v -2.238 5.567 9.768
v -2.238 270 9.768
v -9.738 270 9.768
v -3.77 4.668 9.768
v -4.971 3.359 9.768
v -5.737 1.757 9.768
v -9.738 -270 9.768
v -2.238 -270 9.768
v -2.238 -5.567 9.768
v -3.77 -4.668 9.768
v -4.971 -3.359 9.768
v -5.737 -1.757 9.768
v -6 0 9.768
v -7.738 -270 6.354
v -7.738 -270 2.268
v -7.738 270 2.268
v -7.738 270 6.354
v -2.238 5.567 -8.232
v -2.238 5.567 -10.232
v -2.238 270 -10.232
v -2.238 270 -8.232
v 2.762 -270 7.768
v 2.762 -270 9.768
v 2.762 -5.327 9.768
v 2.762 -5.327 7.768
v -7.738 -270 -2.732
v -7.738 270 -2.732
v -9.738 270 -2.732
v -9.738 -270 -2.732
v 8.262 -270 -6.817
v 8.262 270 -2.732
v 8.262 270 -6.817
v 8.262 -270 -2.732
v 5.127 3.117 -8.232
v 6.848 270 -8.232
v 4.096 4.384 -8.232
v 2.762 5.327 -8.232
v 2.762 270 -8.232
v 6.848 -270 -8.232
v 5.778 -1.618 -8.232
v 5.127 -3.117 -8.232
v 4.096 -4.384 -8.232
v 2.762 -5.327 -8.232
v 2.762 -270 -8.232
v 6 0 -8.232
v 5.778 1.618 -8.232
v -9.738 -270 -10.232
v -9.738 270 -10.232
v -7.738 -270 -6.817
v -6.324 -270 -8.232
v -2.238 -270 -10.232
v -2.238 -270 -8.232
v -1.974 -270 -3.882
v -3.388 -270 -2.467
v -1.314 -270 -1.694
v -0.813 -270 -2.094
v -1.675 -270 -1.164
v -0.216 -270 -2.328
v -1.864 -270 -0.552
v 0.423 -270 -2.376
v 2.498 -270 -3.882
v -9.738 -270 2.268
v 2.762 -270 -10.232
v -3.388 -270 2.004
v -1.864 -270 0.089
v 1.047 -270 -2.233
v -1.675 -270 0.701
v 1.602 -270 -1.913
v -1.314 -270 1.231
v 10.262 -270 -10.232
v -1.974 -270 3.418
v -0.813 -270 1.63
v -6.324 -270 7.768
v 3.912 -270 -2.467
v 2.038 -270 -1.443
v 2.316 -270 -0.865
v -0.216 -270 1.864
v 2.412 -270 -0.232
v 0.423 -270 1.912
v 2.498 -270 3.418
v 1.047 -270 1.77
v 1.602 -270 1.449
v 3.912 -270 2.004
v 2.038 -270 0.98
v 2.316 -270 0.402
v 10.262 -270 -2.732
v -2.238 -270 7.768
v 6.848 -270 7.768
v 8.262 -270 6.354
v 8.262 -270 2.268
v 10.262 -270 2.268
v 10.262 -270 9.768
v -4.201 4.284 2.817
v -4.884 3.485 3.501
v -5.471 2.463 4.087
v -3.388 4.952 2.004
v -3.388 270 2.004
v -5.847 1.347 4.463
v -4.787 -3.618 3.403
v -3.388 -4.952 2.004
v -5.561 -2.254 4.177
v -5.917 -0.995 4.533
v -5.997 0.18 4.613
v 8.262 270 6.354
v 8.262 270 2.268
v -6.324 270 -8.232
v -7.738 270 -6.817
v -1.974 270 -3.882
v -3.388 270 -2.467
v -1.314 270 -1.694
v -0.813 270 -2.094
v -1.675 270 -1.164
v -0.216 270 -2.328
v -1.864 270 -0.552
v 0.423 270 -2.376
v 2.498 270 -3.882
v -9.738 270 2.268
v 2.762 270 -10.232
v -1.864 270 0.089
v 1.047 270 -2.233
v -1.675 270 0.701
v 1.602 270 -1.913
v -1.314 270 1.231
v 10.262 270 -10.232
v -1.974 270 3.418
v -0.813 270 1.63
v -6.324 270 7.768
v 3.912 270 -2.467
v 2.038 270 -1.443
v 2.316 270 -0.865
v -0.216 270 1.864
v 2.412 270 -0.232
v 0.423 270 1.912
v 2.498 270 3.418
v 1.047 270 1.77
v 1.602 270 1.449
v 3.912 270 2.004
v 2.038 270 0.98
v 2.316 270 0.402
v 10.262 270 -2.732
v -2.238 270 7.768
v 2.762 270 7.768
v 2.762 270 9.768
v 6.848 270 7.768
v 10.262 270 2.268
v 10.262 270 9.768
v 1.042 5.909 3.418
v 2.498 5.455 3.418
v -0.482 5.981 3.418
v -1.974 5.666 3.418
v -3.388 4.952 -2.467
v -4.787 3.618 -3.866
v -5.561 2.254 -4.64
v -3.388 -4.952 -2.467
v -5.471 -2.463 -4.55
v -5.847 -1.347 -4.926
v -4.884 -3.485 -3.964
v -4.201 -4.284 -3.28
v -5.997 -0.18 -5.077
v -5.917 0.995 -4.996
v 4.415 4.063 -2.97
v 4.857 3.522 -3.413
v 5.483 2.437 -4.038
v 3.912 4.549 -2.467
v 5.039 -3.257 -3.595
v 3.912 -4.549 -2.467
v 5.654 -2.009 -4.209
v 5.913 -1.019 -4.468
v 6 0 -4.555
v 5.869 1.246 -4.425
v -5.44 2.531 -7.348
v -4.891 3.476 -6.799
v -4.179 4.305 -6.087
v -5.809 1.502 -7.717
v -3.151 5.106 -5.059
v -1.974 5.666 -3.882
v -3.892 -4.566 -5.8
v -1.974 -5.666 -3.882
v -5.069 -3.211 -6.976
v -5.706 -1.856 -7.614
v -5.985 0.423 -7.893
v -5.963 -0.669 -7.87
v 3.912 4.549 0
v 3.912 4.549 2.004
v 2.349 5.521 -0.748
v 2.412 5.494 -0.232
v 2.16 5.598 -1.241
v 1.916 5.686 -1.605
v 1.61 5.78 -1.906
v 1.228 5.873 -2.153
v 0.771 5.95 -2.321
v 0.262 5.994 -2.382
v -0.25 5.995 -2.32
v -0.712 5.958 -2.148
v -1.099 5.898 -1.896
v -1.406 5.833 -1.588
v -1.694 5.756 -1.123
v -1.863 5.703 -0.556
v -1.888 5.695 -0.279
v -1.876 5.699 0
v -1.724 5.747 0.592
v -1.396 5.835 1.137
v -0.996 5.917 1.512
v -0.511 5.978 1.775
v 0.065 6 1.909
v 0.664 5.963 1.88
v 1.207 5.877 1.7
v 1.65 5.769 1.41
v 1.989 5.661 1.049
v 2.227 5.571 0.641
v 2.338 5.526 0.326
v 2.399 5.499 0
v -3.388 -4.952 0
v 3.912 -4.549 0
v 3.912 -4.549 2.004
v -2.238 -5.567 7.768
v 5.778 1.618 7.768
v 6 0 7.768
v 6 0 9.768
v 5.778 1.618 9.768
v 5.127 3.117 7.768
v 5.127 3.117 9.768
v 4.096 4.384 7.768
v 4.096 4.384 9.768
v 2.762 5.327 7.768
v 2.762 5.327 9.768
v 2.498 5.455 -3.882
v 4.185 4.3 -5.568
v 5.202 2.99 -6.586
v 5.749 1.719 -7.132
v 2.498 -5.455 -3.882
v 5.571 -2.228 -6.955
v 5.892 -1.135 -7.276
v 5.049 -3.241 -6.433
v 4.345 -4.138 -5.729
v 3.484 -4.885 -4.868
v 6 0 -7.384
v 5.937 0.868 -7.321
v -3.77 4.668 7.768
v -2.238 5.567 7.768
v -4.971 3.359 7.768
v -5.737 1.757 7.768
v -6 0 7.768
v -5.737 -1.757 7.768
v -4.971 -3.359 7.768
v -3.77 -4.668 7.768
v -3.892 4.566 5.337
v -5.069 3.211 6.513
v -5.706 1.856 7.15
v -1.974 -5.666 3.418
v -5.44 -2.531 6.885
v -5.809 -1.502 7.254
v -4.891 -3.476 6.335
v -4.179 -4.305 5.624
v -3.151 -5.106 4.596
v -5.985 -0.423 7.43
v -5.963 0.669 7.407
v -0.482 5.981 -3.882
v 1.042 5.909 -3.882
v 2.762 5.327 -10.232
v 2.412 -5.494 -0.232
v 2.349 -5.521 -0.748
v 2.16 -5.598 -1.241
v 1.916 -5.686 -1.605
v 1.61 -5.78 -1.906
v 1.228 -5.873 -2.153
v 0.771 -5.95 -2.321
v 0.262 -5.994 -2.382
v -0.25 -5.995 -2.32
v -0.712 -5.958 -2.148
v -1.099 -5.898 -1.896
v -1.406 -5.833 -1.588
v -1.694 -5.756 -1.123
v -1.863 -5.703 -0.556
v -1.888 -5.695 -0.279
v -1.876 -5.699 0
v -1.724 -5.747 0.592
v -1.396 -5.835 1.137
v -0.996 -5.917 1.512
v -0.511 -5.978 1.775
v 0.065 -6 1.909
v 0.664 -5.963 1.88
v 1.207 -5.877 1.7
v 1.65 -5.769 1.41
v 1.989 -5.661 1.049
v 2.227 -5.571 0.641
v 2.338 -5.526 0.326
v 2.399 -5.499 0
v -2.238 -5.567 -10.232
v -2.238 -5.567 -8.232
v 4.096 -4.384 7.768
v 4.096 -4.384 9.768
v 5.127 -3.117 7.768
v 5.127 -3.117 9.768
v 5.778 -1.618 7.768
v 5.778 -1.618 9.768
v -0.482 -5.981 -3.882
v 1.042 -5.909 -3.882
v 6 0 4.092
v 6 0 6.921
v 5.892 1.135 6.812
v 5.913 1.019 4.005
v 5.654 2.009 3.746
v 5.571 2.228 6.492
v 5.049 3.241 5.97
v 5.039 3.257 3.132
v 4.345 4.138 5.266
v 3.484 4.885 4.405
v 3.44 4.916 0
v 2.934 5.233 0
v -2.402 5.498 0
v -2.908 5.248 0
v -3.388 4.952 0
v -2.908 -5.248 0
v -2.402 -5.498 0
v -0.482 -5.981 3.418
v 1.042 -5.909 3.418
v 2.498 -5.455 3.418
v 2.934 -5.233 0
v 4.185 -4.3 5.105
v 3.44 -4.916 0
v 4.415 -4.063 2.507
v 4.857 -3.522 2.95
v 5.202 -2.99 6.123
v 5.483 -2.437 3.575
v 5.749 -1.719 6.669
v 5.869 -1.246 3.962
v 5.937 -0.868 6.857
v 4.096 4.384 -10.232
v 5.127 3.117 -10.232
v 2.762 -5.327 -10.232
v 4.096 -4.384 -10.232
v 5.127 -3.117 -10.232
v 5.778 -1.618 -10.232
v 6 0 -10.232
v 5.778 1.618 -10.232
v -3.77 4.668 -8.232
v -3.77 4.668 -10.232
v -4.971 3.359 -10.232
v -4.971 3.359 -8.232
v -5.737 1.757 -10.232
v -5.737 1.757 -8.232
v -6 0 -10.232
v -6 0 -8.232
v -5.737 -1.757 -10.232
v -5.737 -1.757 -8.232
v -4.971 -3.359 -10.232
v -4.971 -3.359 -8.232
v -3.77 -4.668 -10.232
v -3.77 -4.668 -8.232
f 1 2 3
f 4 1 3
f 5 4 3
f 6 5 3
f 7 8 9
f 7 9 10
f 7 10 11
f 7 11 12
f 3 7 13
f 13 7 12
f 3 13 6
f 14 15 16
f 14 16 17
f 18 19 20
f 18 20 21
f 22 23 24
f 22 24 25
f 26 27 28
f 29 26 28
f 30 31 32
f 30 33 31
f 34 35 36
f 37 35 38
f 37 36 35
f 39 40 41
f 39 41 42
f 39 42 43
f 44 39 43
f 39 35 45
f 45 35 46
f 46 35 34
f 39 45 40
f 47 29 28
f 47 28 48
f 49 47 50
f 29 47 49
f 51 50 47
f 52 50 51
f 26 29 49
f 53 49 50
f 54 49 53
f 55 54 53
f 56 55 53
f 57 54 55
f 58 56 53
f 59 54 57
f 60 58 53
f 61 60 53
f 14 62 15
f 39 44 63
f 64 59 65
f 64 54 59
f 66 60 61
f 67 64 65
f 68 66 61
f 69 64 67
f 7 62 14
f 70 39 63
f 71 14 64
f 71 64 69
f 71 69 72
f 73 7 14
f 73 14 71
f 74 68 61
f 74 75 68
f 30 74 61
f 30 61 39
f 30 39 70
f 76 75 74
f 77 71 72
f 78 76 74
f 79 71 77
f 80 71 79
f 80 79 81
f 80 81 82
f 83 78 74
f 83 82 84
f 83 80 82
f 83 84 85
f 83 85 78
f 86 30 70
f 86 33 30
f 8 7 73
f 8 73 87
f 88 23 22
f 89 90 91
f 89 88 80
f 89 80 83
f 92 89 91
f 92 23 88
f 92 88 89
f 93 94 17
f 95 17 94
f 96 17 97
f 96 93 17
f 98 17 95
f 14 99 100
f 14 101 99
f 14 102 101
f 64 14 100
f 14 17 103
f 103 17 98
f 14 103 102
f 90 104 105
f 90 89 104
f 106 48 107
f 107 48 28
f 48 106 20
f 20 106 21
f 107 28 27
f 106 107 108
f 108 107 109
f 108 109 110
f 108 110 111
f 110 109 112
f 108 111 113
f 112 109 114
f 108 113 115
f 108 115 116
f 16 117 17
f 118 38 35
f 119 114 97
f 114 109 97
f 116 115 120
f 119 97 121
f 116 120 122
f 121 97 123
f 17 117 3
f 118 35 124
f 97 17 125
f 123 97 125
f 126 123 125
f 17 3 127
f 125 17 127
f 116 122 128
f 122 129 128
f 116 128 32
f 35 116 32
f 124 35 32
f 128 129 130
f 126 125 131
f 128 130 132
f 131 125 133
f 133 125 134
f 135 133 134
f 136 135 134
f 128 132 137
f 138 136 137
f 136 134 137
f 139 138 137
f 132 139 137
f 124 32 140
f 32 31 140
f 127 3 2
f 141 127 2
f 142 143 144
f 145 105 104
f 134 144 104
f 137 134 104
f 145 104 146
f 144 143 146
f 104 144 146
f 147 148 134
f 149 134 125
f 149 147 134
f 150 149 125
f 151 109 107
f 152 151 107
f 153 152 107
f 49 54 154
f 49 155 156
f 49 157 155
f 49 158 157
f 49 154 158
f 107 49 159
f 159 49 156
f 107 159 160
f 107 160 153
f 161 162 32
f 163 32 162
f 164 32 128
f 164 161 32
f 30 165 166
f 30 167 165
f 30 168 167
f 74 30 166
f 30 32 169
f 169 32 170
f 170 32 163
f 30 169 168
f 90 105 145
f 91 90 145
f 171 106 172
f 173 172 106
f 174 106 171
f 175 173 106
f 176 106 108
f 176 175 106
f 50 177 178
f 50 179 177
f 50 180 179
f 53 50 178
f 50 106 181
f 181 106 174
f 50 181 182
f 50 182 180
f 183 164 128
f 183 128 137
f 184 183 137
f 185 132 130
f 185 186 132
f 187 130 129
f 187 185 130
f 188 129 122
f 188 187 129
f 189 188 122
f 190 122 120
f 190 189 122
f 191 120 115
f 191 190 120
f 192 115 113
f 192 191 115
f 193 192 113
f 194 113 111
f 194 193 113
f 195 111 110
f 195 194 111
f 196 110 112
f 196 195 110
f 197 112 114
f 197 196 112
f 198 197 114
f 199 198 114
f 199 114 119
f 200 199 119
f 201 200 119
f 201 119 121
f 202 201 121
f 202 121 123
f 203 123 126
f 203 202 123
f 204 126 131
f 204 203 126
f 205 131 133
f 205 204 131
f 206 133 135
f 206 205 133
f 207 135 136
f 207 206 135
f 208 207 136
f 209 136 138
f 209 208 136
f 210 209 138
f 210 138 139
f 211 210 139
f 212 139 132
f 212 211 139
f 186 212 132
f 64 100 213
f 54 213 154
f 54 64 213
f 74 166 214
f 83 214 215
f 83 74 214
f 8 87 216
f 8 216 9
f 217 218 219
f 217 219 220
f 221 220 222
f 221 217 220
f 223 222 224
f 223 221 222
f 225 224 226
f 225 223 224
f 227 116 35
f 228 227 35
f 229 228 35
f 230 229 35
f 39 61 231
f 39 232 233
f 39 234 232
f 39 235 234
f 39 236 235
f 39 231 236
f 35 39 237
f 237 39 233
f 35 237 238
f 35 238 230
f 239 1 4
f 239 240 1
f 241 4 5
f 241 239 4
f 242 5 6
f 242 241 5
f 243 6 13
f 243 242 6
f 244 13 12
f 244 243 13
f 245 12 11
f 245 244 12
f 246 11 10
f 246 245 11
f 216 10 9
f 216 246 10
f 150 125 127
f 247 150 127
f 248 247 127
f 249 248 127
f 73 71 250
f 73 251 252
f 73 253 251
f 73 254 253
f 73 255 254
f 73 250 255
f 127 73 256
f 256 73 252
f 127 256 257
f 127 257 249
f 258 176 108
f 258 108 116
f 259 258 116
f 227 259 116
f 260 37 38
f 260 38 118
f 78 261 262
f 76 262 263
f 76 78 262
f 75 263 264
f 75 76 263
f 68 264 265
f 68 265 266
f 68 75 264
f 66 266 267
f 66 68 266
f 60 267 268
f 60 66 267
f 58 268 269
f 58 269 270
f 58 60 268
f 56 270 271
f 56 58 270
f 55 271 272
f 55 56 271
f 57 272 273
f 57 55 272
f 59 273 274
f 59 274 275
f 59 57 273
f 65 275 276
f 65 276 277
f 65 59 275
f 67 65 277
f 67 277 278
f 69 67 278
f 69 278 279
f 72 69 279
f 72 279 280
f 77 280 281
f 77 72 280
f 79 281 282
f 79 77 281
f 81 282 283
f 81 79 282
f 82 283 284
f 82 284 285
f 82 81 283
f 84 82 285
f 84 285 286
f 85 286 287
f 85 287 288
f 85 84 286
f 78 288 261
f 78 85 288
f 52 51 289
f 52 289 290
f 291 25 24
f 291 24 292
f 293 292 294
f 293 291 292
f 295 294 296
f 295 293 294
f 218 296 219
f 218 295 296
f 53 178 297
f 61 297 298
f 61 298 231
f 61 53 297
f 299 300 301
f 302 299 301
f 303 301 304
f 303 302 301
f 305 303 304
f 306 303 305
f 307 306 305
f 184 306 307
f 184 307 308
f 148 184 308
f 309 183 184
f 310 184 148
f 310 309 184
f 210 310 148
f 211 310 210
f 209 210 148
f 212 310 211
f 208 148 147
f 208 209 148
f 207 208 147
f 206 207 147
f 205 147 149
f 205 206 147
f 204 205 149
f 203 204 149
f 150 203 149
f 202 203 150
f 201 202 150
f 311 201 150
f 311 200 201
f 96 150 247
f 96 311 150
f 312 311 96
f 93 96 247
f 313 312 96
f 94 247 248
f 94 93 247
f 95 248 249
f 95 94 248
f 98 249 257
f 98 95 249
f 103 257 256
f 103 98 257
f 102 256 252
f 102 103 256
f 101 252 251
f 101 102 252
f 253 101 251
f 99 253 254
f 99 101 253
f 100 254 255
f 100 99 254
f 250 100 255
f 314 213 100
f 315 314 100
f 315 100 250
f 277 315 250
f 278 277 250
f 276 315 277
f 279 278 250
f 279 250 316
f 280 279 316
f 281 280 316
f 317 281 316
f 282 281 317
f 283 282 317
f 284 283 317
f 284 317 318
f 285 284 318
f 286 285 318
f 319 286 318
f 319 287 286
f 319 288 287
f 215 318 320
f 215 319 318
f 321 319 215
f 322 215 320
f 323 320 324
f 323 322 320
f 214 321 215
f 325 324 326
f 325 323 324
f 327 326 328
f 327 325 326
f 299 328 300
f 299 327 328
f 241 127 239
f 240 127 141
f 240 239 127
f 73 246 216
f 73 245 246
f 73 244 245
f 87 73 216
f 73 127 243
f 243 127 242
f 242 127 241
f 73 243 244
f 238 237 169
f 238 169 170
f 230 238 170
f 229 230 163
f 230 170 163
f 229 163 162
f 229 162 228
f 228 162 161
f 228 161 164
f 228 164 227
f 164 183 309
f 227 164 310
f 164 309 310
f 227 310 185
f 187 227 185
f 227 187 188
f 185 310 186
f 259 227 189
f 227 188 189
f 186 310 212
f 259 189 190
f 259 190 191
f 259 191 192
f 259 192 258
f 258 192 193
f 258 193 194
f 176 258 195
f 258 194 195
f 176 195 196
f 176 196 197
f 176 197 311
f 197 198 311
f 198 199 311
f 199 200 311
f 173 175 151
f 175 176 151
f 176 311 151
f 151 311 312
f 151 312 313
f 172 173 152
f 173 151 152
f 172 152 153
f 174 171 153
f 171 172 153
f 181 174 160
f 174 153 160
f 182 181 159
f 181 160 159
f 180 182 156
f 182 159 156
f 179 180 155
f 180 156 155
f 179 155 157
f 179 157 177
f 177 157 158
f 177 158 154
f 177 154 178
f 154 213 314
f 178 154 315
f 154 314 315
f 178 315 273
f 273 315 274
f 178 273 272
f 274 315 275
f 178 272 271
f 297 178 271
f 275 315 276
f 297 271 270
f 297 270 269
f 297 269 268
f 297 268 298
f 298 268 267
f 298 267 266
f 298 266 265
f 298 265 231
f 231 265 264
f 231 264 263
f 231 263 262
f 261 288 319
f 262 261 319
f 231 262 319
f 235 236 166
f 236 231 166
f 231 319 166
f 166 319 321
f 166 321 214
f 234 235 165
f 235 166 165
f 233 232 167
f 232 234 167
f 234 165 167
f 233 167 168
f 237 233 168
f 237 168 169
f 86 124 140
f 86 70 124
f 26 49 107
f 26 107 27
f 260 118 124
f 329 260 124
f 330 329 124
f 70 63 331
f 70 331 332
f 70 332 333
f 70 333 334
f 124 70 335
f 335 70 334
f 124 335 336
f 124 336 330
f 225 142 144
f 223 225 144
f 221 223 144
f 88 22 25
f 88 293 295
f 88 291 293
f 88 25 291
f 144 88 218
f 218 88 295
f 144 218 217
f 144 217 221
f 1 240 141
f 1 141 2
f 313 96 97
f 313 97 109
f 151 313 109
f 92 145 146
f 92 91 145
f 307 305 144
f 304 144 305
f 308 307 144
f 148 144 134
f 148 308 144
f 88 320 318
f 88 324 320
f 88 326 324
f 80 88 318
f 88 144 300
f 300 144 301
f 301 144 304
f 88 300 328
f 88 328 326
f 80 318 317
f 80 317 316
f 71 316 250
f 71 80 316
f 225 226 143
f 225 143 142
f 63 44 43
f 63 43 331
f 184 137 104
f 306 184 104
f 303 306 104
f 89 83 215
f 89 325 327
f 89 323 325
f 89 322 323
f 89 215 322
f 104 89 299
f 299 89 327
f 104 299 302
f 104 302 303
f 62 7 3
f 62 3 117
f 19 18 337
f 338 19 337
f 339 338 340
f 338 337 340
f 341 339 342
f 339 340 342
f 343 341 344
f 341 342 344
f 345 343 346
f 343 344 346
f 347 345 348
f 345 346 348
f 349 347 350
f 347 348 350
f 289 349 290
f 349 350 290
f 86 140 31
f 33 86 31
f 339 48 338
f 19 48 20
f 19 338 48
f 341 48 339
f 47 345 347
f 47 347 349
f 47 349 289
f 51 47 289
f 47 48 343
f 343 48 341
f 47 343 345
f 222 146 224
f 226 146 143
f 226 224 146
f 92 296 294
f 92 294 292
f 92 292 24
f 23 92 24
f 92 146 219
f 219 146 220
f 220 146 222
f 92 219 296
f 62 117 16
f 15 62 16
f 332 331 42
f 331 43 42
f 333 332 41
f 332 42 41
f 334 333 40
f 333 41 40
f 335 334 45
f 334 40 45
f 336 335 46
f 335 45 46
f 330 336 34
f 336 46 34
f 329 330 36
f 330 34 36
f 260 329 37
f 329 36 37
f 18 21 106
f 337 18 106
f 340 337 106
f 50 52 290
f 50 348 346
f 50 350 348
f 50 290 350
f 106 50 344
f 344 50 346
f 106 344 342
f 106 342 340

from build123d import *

# Parameters (mm, degrees)
F1_DEPTH      = 270
F1_DEPTH_BACK = 270
F2_R          = 6
F3_DEPTH      = 25
F3_DEPTH_BACK = 25


with BuildPart() as f1:
    # F0 (on Front) → F1 (new body, two sides)
    with BuildSketch(Plane.XZ) as f1_sk:
        Polygon((-2.2380451747, 9.7684033074), (-9.7380451747, 9.7684033074), (-9.7380451747, 2.2684033074), (-7.7380451747, 2.2684033074), (-7.7380451747, 6.354189745), (-3.3880451747, 2.004189745), (-3.3880451747, -0.2315966926), (-3.3880451747, -2.4673831302), (-7.7380451747, -6.8173831302), (-7.7380451747, -2.7315966926), (-9.7380451747, -2.7315966926), (-9.7380451747, -10.2315966926), (-2.2380451747, -10.2315966926), (-2.2380451747, -8.2315966926), (-6.3238316124, -8.2315966926), (-1.9738316124, -3.8815966926), (2.4977412629, -3.8815966926), (6.8477412629, -8.2315966926), (2.7619548253, -8.2315966926), (2.7619548253, -10.2315966926), (10.2619548253, -10.2315966926), (10.2619548253, -2.7315966926), (8.2619548253, -2.7315966926), (8.2619548253, -6.8173831302), (3.9119548253, -2.4673831302), (3.9119548253, -0.2315966926), (3.9119548253, 2.004189745), (8.2619548253, 6.354189745), (8.2619548253, 2.2684033074), (10.2619548253, 2.2684033074), (10.2619548253, 9.7684033074), (2.7619548253, 9.7684033074), (2.7619548253, 7.7684033074), (6.8477412629, 7.7684033074), (2.4977412629, 3.4184033074), (-1.9738316124, 3.4184033074), (-6.3238316124, 7.7684033074), (-2.2380451747, 7.7684033074), align=None)
        with BuildLine():
            ThreePointArc((-1.8880451747, -0.2315966926), (0.2619548253, 1.9184033074), (2.4119548253, -0.2315966926))
            ThreePointArc((2.4119548253, -0.2315966926), (0.2619548253, -2.3815966926), (-1.8880451747, -0.2315966926))
        make_face(mode=Mode.SUBTRACT)
    extrude(amount=F1_DEPTH)
    extrude(f1_sk.sketch, amount=-F1_DEPTH_BACK)

    # F2 (on Top) → F3 (cut, two sides)
    with BuildSketch(Plane.XY) as f3_sk:
        Circle(F2_R)
    extrude(amount=-F3_DEPTH, mode=Mode.SUBTRACT)
    extrude(f3_sk.sketch, amount=F3_DEPTH_BACK, mode=Mode.SUBTRACT)


solid = f1.part
